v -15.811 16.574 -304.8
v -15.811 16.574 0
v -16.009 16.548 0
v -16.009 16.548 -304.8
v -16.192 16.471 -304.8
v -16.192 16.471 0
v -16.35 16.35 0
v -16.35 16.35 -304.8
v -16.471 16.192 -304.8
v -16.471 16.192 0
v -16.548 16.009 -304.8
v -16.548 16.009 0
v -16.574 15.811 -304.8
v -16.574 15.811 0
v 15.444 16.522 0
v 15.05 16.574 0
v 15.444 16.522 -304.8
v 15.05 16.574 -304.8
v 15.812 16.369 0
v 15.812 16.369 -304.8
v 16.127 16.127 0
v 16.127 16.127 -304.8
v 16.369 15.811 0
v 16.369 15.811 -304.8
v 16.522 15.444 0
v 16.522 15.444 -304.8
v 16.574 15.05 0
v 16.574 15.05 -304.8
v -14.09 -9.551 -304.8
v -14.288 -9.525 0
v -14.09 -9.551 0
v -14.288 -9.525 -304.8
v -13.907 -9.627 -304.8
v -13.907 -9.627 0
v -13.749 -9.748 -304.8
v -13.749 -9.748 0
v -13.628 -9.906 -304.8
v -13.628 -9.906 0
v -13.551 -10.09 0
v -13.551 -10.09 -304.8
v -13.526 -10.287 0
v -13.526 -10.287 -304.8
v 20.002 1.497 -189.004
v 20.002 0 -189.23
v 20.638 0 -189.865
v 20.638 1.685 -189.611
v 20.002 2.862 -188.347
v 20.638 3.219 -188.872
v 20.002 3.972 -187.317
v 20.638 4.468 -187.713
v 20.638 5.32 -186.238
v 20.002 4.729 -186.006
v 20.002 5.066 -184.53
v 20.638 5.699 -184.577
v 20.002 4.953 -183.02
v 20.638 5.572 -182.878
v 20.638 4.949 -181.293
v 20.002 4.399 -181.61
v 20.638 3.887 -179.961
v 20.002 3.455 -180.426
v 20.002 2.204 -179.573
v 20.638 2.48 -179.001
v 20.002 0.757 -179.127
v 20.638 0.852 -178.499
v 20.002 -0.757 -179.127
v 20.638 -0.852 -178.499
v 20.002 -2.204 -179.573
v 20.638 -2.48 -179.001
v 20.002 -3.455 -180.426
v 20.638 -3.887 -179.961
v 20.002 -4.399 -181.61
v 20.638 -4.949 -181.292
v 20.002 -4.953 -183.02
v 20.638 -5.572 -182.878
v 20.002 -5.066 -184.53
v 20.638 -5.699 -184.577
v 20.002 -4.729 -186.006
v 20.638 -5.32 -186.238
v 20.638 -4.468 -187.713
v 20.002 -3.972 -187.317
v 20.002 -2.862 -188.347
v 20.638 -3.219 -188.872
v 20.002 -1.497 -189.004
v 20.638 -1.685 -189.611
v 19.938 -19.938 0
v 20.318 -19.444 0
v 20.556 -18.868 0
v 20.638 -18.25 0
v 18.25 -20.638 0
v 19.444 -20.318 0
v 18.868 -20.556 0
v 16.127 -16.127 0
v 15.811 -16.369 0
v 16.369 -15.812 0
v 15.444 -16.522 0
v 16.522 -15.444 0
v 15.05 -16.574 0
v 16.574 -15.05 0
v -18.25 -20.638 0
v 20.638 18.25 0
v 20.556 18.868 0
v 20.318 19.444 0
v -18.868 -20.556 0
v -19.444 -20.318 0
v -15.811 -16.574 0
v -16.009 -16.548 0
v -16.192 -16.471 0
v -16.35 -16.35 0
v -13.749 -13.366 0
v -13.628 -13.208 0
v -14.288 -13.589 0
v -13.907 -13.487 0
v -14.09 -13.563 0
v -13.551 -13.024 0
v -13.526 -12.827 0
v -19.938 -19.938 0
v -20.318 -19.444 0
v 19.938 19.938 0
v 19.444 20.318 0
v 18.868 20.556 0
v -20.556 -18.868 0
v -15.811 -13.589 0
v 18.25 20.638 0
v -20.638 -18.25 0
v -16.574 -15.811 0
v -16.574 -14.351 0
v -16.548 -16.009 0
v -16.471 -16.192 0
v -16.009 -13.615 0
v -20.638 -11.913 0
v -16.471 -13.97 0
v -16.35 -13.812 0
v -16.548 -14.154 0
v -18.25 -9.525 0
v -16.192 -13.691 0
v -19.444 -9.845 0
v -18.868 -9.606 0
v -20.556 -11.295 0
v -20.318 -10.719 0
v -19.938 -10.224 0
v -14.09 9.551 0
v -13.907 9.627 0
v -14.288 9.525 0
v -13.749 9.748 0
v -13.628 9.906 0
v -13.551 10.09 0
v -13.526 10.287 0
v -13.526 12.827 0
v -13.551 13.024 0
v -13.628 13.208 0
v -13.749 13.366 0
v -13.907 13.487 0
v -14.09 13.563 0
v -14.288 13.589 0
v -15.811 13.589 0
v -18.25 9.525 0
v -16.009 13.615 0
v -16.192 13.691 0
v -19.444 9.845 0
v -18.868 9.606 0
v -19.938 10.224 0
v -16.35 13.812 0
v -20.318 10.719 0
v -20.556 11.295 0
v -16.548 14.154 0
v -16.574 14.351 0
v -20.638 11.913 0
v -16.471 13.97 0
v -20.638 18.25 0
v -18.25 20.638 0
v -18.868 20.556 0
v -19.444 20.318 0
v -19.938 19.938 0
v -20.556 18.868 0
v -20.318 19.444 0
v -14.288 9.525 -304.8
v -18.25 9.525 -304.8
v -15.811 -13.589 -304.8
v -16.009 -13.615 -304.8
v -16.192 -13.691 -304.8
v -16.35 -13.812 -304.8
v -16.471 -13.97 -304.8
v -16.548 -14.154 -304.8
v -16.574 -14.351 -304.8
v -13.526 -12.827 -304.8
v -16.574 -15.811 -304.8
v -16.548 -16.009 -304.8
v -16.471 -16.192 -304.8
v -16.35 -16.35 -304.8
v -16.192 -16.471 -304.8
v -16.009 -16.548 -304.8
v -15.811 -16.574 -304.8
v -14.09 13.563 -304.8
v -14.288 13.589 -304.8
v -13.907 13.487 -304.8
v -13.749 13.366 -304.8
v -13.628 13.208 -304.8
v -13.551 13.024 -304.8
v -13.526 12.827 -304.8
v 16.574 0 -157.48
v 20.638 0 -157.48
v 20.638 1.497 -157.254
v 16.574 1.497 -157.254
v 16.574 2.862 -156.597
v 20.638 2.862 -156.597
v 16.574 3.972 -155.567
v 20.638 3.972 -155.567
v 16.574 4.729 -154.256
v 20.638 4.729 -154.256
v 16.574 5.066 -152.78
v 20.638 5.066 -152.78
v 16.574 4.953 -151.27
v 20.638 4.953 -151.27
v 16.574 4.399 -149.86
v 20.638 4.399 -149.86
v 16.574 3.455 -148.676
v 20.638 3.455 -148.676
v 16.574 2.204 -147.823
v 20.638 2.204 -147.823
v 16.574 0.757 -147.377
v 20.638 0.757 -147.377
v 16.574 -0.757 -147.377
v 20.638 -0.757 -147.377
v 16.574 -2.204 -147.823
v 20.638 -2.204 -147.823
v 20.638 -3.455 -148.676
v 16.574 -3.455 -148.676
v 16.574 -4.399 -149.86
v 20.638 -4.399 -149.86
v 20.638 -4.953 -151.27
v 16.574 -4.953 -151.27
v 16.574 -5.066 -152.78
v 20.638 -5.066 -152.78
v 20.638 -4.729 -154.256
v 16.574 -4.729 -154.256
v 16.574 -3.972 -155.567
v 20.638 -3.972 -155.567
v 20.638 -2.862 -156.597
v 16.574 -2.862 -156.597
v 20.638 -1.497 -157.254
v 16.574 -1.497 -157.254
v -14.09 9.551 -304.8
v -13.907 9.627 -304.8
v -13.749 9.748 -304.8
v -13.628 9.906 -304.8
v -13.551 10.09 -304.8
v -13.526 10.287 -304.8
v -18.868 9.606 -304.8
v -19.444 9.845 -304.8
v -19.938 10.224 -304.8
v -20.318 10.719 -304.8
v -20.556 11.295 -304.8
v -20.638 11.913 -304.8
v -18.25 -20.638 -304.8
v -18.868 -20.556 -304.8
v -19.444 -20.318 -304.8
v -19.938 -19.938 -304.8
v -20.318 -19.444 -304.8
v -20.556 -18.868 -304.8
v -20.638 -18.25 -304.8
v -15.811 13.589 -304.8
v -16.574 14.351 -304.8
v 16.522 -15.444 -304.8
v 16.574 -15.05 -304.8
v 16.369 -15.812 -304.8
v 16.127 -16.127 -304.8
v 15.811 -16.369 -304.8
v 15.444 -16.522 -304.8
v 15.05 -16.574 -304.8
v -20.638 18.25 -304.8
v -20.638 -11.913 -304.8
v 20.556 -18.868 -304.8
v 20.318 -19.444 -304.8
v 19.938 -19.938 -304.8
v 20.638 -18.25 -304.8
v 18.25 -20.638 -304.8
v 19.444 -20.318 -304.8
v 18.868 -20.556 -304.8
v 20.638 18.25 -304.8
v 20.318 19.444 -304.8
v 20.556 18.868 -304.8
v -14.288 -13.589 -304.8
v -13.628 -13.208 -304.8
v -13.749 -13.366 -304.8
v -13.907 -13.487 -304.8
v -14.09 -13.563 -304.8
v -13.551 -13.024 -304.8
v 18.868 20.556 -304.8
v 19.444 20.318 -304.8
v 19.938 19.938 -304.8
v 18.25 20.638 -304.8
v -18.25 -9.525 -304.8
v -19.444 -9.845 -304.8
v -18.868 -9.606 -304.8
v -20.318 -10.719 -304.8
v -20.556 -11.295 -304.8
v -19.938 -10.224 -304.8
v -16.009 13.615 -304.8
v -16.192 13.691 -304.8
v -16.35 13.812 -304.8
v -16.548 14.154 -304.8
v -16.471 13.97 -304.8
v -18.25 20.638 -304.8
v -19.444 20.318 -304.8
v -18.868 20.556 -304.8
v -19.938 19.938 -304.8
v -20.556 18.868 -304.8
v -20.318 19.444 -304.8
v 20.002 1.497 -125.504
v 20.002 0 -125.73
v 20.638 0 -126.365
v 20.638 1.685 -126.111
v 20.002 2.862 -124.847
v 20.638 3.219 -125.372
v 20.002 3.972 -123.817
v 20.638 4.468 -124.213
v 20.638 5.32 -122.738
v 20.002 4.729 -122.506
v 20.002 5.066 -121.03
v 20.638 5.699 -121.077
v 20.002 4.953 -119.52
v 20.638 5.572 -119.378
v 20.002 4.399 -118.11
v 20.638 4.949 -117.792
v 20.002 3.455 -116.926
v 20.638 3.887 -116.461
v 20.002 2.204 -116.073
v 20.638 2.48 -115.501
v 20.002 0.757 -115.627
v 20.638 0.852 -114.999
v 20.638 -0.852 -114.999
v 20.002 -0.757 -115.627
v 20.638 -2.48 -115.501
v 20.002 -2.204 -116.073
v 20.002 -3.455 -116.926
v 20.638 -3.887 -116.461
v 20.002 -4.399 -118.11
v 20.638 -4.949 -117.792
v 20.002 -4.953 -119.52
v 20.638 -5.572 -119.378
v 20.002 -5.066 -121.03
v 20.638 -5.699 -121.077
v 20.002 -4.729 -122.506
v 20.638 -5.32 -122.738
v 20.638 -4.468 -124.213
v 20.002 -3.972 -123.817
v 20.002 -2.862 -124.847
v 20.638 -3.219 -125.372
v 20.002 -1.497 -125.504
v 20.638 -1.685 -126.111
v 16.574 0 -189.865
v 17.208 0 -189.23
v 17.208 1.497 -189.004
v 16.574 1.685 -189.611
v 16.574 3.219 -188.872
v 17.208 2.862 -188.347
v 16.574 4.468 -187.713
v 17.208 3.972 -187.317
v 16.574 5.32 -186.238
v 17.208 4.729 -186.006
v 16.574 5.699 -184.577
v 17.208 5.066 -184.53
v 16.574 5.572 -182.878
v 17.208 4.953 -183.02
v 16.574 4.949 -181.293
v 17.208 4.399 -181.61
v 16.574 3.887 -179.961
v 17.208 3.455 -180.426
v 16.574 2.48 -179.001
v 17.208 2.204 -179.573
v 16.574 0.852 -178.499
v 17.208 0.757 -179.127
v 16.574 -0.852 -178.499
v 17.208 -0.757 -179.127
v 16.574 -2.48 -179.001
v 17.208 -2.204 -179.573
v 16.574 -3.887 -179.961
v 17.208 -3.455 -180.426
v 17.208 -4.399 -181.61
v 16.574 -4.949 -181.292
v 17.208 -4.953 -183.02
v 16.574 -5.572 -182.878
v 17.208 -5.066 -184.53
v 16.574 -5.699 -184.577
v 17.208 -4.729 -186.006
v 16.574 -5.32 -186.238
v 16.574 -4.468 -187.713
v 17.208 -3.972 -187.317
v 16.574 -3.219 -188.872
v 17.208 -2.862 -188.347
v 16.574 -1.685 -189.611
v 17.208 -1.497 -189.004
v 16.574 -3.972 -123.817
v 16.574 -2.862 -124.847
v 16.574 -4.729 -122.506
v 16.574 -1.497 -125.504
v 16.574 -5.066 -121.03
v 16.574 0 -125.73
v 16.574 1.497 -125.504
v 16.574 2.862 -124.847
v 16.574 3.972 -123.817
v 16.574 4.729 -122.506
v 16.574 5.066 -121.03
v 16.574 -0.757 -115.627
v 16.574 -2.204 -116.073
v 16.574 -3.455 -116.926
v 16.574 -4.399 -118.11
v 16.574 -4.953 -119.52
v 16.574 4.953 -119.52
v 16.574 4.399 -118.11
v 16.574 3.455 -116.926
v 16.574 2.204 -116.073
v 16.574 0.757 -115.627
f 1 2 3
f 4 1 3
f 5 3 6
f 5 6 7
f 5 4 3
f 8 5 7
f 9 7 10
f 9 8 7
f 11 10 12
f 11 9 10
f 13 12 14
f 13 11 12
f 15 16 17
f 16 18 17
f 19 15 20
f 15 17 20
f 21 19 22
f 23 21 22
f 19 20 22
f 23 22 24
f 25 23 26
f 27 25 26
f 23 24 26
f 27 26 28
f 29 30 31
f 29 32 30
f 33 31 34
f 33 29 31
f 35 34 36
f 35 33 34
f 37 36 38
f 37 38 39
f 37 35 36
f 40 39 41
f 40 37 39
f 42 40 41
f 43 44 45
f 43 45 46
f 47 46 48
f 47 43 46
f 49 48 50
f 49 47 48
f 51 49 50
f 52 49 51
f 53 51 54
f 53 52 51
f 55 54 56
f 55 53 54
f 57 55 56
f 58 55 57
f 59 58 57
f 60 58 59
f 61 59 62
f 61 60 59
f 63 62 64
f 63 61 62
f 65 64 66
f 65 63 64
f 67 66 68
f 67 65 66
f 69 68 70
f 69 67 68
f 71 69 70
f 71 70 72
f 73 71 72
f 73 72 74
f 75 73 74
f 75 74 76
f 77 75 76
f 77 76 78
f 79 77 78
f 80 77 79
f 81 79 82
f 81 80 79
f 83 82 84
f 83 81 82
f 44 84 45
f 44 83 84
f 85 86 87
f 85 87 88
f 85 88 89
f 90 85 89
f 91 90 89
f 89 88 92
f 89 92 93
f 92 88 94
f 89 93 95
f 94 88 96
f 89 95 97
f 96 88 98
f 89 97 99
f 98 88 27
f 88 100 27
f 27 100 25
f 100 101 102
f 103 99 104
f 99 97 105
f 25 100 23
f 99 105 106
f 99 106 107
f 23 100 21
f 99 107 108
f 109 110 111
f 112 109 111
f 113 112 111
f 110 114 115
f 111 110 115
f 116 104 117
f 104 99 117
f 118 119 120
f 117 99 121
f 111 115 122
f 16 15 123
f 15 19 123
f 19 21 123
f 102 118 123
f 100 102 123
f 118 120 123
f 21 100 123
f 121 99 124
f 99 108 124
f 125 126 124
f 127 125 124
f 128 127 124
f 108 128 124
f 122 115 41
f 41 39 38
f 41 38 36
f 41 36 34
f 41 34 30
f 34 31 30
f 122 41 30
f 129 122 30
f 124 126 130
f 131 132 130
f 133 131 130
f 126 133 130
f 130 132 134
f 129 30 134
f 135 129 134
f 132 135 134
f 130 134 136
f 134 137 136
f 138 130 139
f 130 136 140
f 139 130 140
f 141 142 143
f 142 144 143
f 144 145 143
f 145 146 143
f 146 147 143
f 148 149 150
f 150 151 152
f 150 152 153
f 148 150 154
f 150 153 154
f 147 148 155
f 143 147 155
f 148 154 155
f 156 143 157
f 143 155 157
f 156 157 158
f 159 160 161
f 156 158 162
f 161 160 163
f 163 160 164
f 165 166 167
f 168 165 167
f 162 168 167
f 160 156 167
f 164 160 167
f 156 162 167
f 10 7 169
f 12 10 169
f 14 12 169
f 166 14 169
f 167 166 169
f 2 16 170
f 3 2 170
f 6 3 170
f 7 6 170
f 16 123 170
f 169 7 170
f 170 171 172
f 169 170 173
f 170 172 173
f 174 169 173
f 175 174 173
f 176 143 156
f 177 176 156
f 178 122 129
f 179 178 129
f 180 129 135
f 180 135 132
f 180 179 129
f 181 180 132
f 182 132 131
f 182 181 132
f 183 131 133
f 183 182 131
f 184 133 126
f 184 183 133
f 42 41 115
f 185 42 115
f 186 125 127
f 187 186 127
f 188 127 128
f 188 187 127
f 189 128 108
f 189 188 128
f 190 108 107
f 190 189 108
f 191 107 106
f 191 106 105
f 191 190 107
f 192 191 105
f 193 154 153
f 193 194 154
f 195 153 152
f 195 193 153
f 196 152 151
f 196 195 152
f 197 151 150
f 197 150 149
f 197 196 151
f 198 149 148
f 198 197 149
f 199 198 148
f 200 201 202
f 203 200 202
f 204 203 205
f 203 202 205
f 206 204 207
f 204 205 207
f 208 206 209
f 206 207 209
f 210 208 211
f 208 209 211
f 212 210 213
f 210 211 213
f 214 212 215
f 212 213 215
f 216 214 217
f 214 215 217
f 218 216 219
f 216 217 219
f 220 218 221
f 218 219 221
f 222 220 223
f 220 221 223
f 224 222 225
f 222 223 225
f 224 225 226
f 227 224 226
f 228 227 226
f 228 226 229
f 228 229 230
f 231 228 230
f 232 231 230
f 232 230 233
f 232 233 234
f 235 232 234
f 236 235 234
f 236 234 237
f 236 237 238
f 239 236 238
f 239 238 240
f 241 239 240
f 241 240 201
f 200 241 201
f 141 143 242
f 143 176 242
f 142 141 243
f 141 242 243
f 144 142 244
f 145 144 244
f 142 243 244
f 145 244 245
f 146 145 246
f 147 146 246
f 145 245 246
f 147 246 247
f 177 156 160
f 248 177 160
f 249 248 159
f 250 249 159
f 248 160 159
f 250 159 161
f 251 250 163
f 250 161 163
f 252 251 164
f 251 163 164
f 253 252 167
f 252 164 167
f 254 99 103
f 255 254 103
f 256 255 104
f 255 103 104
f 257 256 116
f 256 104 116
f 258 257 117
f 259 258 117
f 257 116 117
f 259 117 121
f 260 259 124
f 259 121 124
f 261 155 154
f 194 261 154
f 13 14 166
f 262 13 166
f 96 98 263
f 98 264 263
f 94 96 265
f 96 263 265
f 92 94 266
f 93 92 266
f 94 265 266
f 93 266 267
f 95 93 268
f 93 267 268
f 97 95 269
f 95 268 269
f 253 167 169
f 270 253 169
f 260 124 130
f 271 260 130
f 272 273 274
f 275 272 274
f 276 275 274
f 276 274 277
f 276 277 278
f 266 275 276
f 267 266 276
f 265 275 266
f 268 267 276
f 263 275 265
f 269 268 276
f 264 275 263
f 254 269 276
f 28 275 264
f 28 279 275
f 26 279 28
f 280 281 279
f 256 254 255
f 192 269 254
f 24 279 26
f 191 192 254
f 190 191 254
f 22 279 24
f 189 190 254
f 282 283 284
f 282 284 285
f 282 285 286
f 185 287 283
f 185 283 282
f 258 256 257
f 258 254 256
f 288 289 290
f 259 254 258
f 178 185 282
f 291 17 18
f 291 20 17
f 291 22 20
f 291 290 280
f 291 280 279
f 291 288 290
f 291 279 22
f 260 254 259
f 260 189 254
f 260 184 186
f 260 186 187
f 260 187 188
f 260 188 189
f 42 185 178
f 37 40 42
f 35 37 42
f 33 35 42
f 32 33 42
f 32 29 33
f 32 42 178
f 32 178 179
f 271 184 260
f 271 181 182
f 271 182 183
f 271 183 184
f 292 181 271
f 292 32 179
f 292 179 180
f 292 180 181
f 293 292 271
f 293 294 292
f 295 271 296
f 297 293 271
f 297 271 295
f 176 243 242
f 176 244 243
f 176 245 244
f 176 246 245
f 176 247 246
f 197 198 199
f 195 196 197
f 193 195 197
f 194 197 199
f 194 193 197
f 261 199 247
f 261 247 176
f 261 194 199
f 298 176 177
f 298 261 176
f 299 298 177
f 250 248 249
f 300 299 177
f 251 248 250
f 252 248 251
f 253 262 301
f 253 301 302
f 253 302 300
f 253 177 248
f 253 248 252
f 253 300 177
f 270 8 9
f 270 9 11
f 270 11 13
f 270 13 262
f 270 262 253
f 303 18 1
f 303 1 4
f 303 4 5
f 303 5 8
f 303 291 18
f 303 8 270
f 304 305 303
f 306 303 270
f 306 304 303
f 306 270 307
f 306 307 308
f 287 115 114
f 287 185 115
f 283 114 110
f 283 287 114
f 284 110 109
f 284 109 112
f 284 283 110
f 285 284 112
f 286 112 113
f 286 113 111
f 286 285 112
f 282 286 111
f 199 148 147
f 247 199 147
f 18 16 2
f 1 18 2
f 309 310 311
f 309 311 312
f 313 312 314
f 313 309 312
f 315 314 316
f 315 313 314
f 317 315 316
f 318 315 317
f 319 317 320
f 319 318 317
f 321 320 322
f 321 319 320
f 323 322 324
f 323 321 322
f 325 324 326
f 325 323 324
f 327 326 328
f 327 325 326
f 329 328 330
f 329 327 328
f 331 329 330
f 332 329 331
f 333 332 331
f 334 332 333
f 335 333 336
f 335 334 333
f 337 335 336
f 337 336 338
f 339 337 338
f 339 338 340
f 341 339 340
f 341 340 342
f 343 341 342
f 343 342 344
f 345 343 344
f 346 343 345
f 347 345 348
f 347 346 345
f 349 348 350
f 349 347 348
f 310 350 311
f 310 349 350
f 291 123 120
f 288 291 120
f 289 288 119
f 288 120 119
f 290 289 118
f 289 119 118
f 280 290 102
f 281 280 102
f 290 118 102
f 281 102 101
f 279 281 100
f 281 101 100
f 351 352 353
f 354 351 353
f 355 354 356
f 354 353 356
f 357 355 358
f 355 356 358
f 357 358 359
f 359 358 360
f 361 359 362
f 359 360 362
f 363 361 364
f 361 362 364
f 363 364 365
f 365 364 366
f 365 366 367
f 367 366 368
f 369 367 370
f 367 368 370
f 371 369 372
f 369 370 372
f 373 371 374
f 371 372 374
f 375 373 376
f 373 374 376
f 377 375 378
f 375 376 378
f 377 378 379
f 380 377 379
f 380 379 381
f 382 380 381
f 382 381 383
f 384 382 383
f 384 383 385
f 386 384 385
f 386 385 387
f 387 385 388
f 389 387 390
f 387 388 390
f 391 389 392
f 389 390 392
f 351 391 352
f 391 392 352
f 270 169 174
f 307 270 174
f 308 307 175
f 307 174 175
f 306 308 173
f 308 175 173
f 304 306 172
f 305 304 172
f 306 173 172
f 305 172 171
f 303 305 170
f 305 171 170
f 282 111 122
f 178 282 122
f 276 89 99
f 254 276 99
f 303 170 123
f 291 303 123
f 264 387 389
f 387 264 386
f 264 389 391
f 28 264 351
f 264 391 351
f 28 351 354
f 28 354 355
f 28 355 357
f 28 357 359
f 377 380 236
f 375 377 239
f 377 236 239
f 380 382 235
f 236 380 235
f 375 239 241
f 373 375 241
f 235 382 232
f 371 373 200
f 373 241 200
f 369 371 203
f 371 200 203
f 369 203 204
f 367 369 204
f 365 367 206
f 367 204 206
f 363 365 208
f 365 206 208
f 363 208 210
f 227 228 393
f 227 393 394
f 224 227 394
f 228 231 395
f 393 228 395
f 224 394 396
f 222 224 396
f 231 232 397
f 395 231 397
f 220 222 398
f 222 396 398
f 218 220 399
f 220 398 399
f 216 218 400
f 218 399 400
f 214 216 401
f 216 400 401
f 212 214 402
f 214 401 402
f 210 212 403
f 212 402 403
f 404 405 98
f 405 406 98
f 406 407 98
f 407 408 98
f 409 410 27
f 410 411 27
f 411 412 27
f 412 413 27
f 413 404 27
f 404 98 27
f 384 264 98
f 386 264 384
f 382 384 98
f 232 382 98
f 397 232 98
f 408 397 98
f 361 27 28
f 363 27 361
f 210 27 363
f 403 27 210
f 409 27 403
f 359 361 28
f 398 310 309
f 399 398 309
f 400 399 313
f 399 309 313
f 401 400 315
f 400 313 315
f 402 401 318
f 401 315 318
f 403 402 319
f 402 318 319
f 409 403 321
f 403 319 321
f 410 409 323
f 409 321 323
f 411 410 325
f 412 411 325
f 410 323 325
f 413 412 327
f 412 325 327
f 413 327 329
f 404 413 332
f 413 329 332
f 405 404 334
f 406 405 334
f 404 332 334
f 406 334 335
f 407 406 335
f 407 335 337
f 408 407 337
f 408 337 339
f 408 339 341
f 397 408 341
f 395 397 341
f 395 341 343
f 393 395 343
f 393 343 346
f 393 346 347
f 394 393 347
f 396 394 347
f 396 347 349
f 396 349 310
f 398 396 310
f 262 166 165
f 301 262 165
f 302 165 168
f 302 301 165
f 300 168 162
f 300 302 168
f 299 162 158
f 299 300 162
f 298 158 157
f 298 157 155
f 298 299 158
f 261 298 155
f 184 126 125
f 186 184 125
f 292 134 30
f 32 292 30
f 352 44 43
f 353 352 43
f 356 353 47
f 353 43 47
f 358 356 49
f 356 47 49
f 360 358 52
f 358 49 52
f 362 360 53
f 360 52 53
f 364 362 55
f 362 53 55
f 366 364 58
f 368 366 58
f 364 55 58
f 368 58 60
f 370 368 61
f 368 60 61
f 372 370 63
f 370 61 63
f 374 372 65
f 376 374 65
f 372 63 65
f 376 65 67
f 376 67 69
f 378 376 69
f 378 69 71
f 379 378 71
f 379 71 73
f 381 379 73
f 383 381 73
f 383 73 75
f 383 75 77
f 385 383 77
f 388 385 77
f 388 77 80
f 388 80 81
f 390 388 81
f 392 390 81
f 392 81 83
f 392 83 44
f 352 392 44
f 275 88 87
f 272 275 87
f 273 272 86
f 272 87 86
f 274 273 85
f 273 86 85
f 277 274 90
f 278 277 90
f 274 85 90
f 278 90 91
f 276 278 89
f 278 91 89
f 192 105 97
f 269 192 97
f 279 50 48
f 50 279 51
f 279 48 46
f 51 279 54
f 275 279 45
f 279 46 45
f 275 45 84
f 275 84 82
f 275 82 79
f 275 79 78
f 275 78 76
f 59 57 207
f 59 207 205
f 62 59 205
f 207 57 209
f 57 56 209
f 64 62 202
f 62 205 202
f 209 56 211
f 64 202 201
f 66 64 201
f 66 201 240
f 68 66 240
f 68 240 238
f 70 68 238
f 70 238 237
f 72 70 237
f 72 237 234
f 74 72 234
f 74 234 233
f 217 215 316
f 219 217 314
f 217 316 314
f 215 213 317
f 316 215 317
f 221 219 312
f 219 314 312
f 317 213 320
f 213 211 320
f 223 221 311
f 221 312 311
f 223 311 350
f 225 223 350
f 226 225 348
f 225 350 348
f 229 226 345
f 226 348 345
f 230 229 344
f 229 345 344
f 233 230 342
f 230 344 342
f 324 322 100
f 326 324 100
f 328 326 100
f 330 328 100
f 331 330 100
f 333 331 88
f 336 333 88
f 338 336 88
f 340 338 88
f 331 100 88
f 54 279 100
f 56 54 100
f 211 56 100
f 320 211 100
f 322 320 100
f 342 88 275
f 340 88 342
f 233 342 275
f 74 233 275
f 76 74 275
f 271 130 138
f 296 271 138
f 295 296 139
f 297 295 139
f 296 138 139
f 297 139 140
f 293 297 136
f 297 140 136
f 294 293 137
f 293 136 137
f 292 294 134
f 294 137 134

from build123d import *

# Parameters (mm, degrees)
EXTRUDE_THIN1_DEPTH = 304.8
FILLET2_R           = 0.762
FILLET3_R           = 1.524
SKETCH4_R           = 5.08
CUT_EXTRUDE1_DEPTH  = 309.273534432
CHAMFER1_SIZE       = 0.635


with BuildPart() as part:
    # Sketch1 → Extrude-Thin1 (new body)
    with BuildSketch(Plane.XY):
        with BuildLine():
            Line((-13.5255, 9.525), (-18.2499, 9.525))
            ThreePointArc((-18.2499, 9.525), (-19.938188151, 10.224311849), (-20.6375, 11.9126))
            Line((-20.6375, 11.9126), (-20.6375, 18.2499))
            ThreePointArc((-20.6375, 18.2499), (-19.938188151, 19.938188151), (-18.2499, 20.6375))
            Line((-18.2499, 20.6375), (18.2499, 20.6375))
            ThreePointArc((18.2499, 20.6375), (19.938188151, 19.938188151), (20.6375, 18.2499))
            Line((20.6375, 18.2499), (20.6375, -18.2499))
            ThreePointArc((20.6375, -18.2499), (19.938188151, -19.938188151), (18.2499, -20.6375))
            Line((18.2499, -20.6375), (-18.2499, -20.6375))
            ThreePointArc((-18.2499, -20.6375), (-19.938188151, -19.938188151), (-20.6375, -18.2499))
            Line((-20.6375, -18.2499), (-20.6375, -11.9126))
            ThreePointArc((-20.6375, -11.9126), (-19.938188151, -10.224311849), (-18.2499, -9.525))
            Line((-18.2499, -9.525), (-13.5255, -9.525))
            Line((-13.5255, -9.525), (-13.5255, -13.589))
            Line((-13.5255, -13.589), (-16.5735, -13.589))
            Line((-16.5735, -13.589), (-16.5735, -16.5735))
            Line((-16.5735, -16.5735), (16.5735, -16.5735))
            Line((16.5735, -16.5735), (16.5735, 16.5735))
            Line((16.5735, 16.5735), (-16.5735, 16.5735))
            Line((-16.5735, 16.5735), (-16.5735, 13.589))
            Line((-16.5735, 13.589), (-13.5255, 13.589))
            Line((-13.5255, 13.589), (-13.5255, 9.525))
        make_face()
    extrude(amount=-EXTRUDE_THIN1_DEPTH)

    # Fillet2
    fillet2_edges = [part.edges().sort_by_distance(p)[0] for p in [
        (-16.5735, -13.589, -152.4),
        (-16.5735, -16.5735, -152.4),
        (-16.5735, 16.5735, -152.4),
        (-16.5735, 13.589, -152.4),
        (-13.5255, 13.589, -152.4),
        (-13.5255, 9.525, -152.4),
        (-13.5255, -9.525, -152.4),
        (-13.5255, -13.589, -152.4),
    ]]
    fillet(fillet2_edges, radius=FILLET2_R)

    # Fillet3
    fillet3_edges = [part.edges().sort_by_distance(p)[0] for p in [
        (16.5735, -16.5735, -152.4),
        (16.5735, 16.5735, -152.4),
    ]]
    fillet(fillet3_edges, radius=FILLET3_R)

    # Sketch4 → Cut-Extrude1 (cut, through all)
    with BuildSketch(Plane(origin=(20.6375, 0, 0), x_dir=(0, 0, -1), z_dir=(1, 0, 0))):
        with Locations((152.4, 0)):
            Circle(SKETCH4_R)
        with Locations((184.15, 0)):
            Circle(SKETCH4_R)
        with Locations((120.65, 0)):
            Circle(SKETCH4_R)
    extrude(amount=-CUT_EXTRUDE1_DEPTH, mode=Mode.SUBTRACT)

    # Chamfer1
    chamfer1_edges = [part.edges().sort_by_distance(p)[0] for p in [
        (20.6375, 0, -115.57),
        (16.5735, 0, -179.07),
        (20.6375, 0, -179.07),
    ]]
    chamfer(chamfer1_edges, length=CHAMFER1_SIZE)


solid = part.part
